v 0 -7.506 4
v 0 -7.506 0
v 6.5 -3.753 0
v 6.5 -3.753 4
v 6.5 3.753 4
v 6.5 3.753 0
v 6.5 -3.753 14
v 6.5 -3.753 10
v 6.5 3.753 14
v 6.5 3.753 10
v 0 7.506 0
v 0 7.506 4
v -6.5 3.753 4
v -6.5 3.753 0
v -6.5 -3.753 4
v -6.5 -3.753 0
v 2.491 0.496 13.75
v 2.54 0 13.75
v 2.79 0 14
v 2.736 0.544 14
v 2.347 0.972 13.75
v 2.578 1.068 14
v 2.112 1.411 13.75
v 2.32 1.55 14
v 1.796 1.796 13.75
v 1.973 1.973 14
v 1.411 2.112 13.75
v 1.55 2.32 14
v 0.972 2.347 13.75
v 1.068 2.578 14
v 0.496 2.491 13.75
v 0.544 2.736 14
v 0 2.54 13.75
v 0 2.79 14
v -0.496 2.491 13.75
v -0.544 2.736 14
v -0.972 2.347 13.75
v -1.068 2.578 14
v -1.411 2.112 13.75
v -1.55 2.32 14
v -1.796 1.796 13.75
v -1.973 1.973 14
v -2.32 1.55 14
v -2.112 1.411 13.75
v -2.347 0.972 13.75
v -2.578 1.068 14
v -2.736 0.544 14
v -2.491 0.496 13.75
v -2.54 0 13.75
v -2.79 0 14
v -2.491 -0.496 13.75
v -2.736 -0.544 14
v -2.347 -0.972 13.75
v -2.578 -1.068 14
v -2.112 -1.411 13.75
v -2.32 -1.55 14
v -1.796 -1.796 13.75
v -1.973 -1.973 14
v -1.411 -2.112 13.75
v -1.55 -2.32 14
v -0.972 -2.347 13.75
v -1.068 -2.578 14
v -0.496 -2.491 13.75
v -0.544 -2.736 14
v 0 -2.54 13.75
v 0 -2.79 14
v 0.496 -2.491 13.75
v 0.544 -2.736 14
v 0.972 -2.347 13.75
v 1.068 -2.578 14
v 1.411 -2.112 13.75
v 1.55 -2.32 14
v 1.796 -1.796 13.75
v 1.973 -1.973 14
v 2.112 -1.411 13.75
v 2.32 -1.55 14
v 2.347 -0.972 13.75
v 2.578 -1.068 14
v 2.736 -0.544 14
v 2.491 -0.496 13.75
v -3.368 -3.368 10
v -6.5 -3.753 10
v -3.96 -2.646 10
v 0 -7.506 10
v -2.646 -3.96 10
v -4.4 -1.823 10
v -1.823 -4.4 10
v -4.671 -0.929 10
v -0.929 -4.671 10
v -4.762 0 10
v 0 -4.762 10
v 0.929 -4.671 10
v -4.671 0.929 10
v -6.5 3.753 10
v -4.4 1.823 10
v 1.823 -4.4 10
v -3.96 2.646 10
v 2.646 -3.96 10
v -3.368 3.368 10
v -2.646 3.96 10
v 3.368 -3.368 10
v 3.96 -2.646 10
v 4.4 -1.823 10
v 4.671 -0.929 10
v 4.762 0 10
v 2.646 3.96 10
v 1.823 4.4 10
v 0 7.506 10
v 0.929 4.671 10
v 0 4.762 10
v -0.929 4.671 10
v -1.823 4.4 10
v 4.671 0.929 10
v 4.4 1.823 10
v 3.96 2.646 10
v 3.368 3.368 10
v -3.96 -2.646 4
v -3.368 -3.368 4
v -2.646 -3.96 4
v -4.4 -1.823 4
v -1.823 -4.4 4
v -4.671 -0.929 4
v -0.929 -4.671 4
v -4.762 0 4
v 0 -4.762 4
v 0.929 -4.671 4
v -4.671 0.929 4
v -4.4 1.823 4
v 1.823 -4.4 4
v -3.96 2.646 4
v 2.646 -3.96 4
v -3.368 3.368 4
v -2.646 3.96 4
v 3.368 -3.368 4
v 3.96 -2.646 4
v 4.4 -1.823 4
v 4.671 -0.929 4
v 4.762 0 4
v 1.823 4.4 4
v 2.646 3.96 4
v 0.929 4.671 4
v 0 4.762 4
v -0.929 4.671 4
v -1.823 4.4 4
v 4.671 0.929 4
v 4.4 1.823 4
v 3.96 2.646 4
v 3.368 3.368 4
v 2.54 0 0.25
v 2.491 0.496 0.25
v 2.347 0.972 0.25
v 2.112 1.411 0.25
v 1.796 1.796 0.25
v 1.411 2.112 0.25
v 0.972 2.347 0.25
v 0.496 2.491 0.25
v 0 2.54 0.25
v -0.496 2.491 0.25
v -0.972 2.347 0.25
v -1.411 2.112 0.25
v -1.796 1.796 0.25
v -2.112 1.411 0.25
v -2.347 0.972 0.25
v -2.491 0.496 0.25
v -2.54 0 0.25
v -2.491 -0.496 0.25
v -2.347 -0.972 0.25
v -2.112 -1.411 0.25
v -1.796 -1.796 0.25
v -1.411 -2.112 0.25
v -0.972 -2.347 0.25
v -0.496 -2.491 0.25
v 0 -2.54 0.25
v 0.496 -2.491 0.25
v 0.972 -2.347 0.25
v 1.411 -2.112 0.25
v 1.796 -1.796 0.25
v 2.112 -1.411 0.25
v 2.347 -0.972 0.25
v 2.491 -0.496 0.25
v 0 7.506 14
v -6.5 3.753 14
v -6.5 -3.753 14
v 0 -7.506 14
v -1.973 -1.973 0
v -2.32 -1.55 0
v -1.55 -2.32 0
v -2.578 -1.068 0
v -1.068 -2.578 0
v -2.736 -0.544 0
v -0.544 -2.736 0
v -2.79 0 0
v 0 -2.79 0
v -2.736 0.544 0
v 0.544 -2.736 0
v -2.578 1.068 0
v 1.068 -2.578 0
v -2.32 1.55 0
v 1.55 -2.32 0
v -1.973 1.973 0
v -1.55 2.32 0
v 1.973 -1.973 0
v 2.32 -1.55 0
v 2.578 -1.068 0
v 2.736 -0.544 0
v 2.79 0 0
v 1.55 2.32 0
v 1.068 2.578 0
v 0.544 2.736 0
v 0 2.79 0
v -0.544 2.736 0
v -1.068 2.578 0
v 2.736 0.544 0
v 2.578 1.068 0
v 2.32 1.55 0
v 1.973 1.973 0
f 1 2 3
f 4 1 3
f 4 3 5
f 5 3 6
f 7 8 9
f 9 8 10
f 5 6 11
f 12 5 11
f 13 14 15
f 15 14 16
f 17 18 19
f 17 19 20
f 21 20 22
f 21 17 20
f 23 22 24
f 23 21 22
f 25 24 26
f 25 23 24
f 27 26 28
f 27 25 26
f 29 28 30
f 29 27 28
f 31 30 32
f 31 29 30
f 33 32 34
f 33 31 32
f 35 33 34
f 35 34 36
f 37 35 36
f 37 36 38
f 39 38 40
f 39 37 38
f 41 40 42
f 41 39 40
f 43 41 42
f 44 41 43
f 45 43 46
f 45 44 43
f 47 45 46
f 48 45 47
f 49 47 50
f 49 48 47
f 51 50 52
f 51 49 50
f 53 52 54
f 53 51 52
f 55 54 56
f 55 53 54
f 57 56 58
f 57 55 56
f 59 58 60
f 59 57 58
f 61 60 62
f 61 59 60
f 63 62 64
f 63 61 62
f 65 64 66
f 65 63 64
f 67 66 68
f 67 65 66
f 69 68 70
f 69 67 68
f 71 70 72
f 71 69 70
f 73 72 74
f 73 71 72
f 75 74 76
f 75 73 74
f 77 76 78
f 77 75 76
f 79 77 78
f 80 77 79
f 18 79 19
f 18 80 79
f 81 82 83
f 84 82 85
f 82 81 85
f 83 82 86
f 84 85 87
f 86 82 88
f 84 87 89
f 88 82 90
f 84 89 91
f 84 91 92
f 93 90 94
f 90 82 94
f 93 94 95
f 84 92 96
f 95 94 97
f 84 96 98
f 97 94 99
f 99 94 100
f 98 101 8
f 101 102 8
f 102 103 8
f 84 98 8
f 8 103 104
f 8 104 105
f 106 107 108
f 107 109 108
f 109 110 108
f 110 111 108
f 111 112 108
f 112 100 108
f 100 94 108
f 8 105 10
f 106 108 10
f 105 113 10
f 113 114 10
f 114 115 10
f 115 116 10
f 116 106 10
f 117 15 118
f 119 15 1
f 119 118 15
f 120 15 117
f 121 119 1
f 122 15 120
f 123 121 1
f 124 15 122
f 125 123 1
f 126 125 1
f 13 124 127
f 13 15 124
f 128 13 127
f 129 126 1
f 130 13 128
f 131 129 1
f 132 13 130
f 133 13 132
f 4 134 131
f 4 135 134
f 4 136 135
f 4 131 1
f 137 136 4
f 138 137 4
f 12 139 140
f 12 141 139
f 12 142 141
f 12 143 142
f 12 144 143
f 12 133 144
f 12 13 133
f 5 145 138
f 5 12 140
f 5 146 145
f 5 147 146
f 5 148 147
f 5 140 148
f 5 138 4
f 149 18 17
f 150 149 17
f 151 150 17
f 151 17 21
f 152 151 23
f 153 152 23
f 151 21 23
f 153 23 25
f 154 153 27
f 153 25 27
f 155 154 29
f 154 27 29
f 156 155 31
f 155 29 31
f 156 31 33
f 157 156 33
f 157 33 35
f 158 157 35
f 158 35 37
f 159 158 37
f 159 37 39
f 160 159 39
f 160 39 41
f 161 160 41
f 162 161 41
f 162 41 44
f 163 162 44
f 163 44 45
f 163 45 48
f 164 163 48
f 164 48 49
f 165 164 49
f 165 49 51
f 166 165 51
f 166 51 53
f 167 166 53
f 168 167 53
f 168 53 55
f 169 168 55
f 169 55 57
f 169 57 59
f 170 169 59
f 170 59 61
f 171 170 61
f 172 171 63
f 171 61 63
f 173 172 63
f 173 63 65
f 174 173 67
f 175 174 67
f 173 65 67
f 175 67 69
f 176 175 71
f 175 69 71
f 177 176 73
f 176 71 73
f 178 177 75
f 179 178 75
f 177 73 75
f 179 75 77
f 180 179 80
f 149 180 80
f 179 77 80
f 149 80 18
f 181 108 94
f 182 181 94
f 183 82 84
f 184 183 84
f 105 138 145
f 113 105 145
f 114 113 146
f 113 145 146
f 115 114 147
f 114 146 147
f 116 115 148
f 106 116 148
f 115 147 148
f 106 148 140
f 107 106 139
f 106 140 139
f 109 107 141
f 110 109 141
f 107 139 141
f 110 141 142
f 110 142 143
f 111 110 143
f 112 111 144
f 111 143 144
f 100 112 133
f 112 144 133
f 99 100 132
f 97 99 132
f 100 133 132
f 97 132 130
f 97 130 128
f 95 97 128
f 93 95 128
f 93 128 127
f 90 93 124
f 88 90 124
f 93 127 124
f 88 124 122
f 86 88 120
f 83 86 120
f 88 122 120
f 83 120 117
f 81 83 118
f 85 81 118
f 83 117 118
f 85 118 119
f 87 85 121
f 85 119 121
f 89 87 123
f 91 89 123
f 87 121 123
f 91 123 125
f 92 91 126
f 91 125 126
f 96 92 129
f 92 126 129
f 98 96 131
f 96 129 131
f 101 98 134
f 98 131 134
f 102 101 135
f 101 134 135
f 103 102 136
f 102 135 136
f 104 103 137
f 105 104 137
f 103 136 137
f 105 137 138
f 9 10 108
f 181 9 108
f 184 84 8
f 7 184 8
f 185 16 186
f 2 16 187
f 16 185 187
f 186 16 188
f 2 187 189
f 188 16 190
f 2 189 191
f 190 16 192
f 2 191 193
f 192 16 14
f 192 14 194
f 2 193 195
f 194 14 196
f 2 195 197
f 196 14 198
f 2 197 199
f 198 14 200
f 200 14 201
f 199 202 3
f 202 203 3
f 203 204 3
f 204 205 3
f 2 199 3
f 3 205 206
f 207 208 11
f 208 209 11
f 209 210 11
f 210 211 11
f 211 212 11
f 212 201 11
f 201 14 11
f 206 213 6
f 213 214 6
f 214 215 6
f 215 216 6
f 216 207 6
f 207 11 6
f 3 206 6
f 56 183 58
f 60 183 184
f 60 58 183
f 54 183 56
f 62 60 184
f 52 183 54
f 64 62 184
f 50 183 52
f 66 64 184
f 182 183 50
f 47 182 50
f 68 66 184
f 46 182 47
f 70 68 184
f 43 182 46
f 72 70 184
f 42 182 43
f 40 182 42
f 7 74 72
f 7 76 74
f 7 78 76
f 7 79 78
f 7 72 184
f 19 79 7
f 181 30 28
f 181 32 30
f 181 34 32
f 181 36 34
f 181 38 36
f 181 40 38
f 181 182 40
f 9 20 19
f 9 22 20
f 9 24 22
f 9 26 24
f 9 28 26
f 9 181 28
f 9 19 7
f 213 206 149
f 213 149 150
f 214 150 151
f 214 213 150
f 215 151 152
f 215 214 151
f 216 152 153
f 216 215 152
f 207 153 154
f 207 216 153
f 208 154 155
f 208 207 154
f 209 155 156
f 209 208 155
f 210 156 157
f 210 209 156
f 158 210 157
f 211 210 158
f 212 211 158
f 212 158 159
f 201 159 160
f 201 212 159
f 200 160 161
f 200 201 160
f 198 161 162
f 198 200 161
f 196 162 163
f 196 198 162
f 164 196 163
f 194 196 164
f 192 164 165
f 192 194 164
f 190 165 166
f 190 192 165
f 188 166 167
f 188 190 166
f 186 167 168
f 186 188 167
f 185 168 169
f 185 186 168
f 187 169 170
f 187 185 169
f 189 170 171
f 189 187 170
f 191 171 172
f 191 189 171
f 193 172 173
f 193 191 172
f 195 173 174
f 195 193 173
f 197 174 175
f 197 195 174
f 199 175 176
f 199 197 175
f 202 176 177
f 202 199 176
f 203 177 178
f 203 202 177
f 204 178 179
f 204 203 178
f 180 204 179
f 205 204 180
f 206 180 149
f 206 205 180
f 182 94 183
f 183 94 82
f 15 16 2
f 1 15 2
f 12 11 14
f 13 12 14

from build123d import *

# Parameters (mm, degrees)
F1_DEPTH = 4
F2_R     = 4.7625
F3_DEPTH = 6
F5_DEPTH = 4
F6_R     = 2.54
F7_DEPTH = 25
F8_SIZE  = 0.25


with BuildPart() as f1:
    # F0 (on Top) → F1 (new body)
    with BuildSketch(Plane.XY):
        Polygon((0, 7.505553), (-6.5, 3.752776), (-6.5, -3.752777), (0, -7.505553), (6.5, -3.752776), (6.5, 3.752777), align=None)
    extrude(amount=F1_DEPTH)

    # F2 (on face) → F3 (join)
    with BuildSketch(Plane.XY.offset(4)):
        Circle(F2_R)
    extrude(amount=F3_DEPTH)

    # F4 (on face) → F5 (join)
    with BuildSketch(Plane.XY.offset(10)):
        Polygon((-6.5, 3.752777), (-6.5, -3.752777), (0, -7.505553), (6.5, -3.752777), (6.5, 3.752777), (0, 7.505553), align=None)
    extrude(amount=F5_DEPTH)

    # F6 (on face) → F7 (cut)
    with BuildSketch(Plane.XY.offset(14)):
        Circle(F6_R)
    extrude(amount=-F7_DEPTH, mode=Mode.SUBTRACT)

    # F8
    f8_edges = [f1.edges().sort_by_distance(p)[0] for p in [
        (-2.54, 0, 14),
        (-2.54, 0, 0),
    ]]
    chamfer(f8_edges, length=F8_SIZE)


solid = f1.part
